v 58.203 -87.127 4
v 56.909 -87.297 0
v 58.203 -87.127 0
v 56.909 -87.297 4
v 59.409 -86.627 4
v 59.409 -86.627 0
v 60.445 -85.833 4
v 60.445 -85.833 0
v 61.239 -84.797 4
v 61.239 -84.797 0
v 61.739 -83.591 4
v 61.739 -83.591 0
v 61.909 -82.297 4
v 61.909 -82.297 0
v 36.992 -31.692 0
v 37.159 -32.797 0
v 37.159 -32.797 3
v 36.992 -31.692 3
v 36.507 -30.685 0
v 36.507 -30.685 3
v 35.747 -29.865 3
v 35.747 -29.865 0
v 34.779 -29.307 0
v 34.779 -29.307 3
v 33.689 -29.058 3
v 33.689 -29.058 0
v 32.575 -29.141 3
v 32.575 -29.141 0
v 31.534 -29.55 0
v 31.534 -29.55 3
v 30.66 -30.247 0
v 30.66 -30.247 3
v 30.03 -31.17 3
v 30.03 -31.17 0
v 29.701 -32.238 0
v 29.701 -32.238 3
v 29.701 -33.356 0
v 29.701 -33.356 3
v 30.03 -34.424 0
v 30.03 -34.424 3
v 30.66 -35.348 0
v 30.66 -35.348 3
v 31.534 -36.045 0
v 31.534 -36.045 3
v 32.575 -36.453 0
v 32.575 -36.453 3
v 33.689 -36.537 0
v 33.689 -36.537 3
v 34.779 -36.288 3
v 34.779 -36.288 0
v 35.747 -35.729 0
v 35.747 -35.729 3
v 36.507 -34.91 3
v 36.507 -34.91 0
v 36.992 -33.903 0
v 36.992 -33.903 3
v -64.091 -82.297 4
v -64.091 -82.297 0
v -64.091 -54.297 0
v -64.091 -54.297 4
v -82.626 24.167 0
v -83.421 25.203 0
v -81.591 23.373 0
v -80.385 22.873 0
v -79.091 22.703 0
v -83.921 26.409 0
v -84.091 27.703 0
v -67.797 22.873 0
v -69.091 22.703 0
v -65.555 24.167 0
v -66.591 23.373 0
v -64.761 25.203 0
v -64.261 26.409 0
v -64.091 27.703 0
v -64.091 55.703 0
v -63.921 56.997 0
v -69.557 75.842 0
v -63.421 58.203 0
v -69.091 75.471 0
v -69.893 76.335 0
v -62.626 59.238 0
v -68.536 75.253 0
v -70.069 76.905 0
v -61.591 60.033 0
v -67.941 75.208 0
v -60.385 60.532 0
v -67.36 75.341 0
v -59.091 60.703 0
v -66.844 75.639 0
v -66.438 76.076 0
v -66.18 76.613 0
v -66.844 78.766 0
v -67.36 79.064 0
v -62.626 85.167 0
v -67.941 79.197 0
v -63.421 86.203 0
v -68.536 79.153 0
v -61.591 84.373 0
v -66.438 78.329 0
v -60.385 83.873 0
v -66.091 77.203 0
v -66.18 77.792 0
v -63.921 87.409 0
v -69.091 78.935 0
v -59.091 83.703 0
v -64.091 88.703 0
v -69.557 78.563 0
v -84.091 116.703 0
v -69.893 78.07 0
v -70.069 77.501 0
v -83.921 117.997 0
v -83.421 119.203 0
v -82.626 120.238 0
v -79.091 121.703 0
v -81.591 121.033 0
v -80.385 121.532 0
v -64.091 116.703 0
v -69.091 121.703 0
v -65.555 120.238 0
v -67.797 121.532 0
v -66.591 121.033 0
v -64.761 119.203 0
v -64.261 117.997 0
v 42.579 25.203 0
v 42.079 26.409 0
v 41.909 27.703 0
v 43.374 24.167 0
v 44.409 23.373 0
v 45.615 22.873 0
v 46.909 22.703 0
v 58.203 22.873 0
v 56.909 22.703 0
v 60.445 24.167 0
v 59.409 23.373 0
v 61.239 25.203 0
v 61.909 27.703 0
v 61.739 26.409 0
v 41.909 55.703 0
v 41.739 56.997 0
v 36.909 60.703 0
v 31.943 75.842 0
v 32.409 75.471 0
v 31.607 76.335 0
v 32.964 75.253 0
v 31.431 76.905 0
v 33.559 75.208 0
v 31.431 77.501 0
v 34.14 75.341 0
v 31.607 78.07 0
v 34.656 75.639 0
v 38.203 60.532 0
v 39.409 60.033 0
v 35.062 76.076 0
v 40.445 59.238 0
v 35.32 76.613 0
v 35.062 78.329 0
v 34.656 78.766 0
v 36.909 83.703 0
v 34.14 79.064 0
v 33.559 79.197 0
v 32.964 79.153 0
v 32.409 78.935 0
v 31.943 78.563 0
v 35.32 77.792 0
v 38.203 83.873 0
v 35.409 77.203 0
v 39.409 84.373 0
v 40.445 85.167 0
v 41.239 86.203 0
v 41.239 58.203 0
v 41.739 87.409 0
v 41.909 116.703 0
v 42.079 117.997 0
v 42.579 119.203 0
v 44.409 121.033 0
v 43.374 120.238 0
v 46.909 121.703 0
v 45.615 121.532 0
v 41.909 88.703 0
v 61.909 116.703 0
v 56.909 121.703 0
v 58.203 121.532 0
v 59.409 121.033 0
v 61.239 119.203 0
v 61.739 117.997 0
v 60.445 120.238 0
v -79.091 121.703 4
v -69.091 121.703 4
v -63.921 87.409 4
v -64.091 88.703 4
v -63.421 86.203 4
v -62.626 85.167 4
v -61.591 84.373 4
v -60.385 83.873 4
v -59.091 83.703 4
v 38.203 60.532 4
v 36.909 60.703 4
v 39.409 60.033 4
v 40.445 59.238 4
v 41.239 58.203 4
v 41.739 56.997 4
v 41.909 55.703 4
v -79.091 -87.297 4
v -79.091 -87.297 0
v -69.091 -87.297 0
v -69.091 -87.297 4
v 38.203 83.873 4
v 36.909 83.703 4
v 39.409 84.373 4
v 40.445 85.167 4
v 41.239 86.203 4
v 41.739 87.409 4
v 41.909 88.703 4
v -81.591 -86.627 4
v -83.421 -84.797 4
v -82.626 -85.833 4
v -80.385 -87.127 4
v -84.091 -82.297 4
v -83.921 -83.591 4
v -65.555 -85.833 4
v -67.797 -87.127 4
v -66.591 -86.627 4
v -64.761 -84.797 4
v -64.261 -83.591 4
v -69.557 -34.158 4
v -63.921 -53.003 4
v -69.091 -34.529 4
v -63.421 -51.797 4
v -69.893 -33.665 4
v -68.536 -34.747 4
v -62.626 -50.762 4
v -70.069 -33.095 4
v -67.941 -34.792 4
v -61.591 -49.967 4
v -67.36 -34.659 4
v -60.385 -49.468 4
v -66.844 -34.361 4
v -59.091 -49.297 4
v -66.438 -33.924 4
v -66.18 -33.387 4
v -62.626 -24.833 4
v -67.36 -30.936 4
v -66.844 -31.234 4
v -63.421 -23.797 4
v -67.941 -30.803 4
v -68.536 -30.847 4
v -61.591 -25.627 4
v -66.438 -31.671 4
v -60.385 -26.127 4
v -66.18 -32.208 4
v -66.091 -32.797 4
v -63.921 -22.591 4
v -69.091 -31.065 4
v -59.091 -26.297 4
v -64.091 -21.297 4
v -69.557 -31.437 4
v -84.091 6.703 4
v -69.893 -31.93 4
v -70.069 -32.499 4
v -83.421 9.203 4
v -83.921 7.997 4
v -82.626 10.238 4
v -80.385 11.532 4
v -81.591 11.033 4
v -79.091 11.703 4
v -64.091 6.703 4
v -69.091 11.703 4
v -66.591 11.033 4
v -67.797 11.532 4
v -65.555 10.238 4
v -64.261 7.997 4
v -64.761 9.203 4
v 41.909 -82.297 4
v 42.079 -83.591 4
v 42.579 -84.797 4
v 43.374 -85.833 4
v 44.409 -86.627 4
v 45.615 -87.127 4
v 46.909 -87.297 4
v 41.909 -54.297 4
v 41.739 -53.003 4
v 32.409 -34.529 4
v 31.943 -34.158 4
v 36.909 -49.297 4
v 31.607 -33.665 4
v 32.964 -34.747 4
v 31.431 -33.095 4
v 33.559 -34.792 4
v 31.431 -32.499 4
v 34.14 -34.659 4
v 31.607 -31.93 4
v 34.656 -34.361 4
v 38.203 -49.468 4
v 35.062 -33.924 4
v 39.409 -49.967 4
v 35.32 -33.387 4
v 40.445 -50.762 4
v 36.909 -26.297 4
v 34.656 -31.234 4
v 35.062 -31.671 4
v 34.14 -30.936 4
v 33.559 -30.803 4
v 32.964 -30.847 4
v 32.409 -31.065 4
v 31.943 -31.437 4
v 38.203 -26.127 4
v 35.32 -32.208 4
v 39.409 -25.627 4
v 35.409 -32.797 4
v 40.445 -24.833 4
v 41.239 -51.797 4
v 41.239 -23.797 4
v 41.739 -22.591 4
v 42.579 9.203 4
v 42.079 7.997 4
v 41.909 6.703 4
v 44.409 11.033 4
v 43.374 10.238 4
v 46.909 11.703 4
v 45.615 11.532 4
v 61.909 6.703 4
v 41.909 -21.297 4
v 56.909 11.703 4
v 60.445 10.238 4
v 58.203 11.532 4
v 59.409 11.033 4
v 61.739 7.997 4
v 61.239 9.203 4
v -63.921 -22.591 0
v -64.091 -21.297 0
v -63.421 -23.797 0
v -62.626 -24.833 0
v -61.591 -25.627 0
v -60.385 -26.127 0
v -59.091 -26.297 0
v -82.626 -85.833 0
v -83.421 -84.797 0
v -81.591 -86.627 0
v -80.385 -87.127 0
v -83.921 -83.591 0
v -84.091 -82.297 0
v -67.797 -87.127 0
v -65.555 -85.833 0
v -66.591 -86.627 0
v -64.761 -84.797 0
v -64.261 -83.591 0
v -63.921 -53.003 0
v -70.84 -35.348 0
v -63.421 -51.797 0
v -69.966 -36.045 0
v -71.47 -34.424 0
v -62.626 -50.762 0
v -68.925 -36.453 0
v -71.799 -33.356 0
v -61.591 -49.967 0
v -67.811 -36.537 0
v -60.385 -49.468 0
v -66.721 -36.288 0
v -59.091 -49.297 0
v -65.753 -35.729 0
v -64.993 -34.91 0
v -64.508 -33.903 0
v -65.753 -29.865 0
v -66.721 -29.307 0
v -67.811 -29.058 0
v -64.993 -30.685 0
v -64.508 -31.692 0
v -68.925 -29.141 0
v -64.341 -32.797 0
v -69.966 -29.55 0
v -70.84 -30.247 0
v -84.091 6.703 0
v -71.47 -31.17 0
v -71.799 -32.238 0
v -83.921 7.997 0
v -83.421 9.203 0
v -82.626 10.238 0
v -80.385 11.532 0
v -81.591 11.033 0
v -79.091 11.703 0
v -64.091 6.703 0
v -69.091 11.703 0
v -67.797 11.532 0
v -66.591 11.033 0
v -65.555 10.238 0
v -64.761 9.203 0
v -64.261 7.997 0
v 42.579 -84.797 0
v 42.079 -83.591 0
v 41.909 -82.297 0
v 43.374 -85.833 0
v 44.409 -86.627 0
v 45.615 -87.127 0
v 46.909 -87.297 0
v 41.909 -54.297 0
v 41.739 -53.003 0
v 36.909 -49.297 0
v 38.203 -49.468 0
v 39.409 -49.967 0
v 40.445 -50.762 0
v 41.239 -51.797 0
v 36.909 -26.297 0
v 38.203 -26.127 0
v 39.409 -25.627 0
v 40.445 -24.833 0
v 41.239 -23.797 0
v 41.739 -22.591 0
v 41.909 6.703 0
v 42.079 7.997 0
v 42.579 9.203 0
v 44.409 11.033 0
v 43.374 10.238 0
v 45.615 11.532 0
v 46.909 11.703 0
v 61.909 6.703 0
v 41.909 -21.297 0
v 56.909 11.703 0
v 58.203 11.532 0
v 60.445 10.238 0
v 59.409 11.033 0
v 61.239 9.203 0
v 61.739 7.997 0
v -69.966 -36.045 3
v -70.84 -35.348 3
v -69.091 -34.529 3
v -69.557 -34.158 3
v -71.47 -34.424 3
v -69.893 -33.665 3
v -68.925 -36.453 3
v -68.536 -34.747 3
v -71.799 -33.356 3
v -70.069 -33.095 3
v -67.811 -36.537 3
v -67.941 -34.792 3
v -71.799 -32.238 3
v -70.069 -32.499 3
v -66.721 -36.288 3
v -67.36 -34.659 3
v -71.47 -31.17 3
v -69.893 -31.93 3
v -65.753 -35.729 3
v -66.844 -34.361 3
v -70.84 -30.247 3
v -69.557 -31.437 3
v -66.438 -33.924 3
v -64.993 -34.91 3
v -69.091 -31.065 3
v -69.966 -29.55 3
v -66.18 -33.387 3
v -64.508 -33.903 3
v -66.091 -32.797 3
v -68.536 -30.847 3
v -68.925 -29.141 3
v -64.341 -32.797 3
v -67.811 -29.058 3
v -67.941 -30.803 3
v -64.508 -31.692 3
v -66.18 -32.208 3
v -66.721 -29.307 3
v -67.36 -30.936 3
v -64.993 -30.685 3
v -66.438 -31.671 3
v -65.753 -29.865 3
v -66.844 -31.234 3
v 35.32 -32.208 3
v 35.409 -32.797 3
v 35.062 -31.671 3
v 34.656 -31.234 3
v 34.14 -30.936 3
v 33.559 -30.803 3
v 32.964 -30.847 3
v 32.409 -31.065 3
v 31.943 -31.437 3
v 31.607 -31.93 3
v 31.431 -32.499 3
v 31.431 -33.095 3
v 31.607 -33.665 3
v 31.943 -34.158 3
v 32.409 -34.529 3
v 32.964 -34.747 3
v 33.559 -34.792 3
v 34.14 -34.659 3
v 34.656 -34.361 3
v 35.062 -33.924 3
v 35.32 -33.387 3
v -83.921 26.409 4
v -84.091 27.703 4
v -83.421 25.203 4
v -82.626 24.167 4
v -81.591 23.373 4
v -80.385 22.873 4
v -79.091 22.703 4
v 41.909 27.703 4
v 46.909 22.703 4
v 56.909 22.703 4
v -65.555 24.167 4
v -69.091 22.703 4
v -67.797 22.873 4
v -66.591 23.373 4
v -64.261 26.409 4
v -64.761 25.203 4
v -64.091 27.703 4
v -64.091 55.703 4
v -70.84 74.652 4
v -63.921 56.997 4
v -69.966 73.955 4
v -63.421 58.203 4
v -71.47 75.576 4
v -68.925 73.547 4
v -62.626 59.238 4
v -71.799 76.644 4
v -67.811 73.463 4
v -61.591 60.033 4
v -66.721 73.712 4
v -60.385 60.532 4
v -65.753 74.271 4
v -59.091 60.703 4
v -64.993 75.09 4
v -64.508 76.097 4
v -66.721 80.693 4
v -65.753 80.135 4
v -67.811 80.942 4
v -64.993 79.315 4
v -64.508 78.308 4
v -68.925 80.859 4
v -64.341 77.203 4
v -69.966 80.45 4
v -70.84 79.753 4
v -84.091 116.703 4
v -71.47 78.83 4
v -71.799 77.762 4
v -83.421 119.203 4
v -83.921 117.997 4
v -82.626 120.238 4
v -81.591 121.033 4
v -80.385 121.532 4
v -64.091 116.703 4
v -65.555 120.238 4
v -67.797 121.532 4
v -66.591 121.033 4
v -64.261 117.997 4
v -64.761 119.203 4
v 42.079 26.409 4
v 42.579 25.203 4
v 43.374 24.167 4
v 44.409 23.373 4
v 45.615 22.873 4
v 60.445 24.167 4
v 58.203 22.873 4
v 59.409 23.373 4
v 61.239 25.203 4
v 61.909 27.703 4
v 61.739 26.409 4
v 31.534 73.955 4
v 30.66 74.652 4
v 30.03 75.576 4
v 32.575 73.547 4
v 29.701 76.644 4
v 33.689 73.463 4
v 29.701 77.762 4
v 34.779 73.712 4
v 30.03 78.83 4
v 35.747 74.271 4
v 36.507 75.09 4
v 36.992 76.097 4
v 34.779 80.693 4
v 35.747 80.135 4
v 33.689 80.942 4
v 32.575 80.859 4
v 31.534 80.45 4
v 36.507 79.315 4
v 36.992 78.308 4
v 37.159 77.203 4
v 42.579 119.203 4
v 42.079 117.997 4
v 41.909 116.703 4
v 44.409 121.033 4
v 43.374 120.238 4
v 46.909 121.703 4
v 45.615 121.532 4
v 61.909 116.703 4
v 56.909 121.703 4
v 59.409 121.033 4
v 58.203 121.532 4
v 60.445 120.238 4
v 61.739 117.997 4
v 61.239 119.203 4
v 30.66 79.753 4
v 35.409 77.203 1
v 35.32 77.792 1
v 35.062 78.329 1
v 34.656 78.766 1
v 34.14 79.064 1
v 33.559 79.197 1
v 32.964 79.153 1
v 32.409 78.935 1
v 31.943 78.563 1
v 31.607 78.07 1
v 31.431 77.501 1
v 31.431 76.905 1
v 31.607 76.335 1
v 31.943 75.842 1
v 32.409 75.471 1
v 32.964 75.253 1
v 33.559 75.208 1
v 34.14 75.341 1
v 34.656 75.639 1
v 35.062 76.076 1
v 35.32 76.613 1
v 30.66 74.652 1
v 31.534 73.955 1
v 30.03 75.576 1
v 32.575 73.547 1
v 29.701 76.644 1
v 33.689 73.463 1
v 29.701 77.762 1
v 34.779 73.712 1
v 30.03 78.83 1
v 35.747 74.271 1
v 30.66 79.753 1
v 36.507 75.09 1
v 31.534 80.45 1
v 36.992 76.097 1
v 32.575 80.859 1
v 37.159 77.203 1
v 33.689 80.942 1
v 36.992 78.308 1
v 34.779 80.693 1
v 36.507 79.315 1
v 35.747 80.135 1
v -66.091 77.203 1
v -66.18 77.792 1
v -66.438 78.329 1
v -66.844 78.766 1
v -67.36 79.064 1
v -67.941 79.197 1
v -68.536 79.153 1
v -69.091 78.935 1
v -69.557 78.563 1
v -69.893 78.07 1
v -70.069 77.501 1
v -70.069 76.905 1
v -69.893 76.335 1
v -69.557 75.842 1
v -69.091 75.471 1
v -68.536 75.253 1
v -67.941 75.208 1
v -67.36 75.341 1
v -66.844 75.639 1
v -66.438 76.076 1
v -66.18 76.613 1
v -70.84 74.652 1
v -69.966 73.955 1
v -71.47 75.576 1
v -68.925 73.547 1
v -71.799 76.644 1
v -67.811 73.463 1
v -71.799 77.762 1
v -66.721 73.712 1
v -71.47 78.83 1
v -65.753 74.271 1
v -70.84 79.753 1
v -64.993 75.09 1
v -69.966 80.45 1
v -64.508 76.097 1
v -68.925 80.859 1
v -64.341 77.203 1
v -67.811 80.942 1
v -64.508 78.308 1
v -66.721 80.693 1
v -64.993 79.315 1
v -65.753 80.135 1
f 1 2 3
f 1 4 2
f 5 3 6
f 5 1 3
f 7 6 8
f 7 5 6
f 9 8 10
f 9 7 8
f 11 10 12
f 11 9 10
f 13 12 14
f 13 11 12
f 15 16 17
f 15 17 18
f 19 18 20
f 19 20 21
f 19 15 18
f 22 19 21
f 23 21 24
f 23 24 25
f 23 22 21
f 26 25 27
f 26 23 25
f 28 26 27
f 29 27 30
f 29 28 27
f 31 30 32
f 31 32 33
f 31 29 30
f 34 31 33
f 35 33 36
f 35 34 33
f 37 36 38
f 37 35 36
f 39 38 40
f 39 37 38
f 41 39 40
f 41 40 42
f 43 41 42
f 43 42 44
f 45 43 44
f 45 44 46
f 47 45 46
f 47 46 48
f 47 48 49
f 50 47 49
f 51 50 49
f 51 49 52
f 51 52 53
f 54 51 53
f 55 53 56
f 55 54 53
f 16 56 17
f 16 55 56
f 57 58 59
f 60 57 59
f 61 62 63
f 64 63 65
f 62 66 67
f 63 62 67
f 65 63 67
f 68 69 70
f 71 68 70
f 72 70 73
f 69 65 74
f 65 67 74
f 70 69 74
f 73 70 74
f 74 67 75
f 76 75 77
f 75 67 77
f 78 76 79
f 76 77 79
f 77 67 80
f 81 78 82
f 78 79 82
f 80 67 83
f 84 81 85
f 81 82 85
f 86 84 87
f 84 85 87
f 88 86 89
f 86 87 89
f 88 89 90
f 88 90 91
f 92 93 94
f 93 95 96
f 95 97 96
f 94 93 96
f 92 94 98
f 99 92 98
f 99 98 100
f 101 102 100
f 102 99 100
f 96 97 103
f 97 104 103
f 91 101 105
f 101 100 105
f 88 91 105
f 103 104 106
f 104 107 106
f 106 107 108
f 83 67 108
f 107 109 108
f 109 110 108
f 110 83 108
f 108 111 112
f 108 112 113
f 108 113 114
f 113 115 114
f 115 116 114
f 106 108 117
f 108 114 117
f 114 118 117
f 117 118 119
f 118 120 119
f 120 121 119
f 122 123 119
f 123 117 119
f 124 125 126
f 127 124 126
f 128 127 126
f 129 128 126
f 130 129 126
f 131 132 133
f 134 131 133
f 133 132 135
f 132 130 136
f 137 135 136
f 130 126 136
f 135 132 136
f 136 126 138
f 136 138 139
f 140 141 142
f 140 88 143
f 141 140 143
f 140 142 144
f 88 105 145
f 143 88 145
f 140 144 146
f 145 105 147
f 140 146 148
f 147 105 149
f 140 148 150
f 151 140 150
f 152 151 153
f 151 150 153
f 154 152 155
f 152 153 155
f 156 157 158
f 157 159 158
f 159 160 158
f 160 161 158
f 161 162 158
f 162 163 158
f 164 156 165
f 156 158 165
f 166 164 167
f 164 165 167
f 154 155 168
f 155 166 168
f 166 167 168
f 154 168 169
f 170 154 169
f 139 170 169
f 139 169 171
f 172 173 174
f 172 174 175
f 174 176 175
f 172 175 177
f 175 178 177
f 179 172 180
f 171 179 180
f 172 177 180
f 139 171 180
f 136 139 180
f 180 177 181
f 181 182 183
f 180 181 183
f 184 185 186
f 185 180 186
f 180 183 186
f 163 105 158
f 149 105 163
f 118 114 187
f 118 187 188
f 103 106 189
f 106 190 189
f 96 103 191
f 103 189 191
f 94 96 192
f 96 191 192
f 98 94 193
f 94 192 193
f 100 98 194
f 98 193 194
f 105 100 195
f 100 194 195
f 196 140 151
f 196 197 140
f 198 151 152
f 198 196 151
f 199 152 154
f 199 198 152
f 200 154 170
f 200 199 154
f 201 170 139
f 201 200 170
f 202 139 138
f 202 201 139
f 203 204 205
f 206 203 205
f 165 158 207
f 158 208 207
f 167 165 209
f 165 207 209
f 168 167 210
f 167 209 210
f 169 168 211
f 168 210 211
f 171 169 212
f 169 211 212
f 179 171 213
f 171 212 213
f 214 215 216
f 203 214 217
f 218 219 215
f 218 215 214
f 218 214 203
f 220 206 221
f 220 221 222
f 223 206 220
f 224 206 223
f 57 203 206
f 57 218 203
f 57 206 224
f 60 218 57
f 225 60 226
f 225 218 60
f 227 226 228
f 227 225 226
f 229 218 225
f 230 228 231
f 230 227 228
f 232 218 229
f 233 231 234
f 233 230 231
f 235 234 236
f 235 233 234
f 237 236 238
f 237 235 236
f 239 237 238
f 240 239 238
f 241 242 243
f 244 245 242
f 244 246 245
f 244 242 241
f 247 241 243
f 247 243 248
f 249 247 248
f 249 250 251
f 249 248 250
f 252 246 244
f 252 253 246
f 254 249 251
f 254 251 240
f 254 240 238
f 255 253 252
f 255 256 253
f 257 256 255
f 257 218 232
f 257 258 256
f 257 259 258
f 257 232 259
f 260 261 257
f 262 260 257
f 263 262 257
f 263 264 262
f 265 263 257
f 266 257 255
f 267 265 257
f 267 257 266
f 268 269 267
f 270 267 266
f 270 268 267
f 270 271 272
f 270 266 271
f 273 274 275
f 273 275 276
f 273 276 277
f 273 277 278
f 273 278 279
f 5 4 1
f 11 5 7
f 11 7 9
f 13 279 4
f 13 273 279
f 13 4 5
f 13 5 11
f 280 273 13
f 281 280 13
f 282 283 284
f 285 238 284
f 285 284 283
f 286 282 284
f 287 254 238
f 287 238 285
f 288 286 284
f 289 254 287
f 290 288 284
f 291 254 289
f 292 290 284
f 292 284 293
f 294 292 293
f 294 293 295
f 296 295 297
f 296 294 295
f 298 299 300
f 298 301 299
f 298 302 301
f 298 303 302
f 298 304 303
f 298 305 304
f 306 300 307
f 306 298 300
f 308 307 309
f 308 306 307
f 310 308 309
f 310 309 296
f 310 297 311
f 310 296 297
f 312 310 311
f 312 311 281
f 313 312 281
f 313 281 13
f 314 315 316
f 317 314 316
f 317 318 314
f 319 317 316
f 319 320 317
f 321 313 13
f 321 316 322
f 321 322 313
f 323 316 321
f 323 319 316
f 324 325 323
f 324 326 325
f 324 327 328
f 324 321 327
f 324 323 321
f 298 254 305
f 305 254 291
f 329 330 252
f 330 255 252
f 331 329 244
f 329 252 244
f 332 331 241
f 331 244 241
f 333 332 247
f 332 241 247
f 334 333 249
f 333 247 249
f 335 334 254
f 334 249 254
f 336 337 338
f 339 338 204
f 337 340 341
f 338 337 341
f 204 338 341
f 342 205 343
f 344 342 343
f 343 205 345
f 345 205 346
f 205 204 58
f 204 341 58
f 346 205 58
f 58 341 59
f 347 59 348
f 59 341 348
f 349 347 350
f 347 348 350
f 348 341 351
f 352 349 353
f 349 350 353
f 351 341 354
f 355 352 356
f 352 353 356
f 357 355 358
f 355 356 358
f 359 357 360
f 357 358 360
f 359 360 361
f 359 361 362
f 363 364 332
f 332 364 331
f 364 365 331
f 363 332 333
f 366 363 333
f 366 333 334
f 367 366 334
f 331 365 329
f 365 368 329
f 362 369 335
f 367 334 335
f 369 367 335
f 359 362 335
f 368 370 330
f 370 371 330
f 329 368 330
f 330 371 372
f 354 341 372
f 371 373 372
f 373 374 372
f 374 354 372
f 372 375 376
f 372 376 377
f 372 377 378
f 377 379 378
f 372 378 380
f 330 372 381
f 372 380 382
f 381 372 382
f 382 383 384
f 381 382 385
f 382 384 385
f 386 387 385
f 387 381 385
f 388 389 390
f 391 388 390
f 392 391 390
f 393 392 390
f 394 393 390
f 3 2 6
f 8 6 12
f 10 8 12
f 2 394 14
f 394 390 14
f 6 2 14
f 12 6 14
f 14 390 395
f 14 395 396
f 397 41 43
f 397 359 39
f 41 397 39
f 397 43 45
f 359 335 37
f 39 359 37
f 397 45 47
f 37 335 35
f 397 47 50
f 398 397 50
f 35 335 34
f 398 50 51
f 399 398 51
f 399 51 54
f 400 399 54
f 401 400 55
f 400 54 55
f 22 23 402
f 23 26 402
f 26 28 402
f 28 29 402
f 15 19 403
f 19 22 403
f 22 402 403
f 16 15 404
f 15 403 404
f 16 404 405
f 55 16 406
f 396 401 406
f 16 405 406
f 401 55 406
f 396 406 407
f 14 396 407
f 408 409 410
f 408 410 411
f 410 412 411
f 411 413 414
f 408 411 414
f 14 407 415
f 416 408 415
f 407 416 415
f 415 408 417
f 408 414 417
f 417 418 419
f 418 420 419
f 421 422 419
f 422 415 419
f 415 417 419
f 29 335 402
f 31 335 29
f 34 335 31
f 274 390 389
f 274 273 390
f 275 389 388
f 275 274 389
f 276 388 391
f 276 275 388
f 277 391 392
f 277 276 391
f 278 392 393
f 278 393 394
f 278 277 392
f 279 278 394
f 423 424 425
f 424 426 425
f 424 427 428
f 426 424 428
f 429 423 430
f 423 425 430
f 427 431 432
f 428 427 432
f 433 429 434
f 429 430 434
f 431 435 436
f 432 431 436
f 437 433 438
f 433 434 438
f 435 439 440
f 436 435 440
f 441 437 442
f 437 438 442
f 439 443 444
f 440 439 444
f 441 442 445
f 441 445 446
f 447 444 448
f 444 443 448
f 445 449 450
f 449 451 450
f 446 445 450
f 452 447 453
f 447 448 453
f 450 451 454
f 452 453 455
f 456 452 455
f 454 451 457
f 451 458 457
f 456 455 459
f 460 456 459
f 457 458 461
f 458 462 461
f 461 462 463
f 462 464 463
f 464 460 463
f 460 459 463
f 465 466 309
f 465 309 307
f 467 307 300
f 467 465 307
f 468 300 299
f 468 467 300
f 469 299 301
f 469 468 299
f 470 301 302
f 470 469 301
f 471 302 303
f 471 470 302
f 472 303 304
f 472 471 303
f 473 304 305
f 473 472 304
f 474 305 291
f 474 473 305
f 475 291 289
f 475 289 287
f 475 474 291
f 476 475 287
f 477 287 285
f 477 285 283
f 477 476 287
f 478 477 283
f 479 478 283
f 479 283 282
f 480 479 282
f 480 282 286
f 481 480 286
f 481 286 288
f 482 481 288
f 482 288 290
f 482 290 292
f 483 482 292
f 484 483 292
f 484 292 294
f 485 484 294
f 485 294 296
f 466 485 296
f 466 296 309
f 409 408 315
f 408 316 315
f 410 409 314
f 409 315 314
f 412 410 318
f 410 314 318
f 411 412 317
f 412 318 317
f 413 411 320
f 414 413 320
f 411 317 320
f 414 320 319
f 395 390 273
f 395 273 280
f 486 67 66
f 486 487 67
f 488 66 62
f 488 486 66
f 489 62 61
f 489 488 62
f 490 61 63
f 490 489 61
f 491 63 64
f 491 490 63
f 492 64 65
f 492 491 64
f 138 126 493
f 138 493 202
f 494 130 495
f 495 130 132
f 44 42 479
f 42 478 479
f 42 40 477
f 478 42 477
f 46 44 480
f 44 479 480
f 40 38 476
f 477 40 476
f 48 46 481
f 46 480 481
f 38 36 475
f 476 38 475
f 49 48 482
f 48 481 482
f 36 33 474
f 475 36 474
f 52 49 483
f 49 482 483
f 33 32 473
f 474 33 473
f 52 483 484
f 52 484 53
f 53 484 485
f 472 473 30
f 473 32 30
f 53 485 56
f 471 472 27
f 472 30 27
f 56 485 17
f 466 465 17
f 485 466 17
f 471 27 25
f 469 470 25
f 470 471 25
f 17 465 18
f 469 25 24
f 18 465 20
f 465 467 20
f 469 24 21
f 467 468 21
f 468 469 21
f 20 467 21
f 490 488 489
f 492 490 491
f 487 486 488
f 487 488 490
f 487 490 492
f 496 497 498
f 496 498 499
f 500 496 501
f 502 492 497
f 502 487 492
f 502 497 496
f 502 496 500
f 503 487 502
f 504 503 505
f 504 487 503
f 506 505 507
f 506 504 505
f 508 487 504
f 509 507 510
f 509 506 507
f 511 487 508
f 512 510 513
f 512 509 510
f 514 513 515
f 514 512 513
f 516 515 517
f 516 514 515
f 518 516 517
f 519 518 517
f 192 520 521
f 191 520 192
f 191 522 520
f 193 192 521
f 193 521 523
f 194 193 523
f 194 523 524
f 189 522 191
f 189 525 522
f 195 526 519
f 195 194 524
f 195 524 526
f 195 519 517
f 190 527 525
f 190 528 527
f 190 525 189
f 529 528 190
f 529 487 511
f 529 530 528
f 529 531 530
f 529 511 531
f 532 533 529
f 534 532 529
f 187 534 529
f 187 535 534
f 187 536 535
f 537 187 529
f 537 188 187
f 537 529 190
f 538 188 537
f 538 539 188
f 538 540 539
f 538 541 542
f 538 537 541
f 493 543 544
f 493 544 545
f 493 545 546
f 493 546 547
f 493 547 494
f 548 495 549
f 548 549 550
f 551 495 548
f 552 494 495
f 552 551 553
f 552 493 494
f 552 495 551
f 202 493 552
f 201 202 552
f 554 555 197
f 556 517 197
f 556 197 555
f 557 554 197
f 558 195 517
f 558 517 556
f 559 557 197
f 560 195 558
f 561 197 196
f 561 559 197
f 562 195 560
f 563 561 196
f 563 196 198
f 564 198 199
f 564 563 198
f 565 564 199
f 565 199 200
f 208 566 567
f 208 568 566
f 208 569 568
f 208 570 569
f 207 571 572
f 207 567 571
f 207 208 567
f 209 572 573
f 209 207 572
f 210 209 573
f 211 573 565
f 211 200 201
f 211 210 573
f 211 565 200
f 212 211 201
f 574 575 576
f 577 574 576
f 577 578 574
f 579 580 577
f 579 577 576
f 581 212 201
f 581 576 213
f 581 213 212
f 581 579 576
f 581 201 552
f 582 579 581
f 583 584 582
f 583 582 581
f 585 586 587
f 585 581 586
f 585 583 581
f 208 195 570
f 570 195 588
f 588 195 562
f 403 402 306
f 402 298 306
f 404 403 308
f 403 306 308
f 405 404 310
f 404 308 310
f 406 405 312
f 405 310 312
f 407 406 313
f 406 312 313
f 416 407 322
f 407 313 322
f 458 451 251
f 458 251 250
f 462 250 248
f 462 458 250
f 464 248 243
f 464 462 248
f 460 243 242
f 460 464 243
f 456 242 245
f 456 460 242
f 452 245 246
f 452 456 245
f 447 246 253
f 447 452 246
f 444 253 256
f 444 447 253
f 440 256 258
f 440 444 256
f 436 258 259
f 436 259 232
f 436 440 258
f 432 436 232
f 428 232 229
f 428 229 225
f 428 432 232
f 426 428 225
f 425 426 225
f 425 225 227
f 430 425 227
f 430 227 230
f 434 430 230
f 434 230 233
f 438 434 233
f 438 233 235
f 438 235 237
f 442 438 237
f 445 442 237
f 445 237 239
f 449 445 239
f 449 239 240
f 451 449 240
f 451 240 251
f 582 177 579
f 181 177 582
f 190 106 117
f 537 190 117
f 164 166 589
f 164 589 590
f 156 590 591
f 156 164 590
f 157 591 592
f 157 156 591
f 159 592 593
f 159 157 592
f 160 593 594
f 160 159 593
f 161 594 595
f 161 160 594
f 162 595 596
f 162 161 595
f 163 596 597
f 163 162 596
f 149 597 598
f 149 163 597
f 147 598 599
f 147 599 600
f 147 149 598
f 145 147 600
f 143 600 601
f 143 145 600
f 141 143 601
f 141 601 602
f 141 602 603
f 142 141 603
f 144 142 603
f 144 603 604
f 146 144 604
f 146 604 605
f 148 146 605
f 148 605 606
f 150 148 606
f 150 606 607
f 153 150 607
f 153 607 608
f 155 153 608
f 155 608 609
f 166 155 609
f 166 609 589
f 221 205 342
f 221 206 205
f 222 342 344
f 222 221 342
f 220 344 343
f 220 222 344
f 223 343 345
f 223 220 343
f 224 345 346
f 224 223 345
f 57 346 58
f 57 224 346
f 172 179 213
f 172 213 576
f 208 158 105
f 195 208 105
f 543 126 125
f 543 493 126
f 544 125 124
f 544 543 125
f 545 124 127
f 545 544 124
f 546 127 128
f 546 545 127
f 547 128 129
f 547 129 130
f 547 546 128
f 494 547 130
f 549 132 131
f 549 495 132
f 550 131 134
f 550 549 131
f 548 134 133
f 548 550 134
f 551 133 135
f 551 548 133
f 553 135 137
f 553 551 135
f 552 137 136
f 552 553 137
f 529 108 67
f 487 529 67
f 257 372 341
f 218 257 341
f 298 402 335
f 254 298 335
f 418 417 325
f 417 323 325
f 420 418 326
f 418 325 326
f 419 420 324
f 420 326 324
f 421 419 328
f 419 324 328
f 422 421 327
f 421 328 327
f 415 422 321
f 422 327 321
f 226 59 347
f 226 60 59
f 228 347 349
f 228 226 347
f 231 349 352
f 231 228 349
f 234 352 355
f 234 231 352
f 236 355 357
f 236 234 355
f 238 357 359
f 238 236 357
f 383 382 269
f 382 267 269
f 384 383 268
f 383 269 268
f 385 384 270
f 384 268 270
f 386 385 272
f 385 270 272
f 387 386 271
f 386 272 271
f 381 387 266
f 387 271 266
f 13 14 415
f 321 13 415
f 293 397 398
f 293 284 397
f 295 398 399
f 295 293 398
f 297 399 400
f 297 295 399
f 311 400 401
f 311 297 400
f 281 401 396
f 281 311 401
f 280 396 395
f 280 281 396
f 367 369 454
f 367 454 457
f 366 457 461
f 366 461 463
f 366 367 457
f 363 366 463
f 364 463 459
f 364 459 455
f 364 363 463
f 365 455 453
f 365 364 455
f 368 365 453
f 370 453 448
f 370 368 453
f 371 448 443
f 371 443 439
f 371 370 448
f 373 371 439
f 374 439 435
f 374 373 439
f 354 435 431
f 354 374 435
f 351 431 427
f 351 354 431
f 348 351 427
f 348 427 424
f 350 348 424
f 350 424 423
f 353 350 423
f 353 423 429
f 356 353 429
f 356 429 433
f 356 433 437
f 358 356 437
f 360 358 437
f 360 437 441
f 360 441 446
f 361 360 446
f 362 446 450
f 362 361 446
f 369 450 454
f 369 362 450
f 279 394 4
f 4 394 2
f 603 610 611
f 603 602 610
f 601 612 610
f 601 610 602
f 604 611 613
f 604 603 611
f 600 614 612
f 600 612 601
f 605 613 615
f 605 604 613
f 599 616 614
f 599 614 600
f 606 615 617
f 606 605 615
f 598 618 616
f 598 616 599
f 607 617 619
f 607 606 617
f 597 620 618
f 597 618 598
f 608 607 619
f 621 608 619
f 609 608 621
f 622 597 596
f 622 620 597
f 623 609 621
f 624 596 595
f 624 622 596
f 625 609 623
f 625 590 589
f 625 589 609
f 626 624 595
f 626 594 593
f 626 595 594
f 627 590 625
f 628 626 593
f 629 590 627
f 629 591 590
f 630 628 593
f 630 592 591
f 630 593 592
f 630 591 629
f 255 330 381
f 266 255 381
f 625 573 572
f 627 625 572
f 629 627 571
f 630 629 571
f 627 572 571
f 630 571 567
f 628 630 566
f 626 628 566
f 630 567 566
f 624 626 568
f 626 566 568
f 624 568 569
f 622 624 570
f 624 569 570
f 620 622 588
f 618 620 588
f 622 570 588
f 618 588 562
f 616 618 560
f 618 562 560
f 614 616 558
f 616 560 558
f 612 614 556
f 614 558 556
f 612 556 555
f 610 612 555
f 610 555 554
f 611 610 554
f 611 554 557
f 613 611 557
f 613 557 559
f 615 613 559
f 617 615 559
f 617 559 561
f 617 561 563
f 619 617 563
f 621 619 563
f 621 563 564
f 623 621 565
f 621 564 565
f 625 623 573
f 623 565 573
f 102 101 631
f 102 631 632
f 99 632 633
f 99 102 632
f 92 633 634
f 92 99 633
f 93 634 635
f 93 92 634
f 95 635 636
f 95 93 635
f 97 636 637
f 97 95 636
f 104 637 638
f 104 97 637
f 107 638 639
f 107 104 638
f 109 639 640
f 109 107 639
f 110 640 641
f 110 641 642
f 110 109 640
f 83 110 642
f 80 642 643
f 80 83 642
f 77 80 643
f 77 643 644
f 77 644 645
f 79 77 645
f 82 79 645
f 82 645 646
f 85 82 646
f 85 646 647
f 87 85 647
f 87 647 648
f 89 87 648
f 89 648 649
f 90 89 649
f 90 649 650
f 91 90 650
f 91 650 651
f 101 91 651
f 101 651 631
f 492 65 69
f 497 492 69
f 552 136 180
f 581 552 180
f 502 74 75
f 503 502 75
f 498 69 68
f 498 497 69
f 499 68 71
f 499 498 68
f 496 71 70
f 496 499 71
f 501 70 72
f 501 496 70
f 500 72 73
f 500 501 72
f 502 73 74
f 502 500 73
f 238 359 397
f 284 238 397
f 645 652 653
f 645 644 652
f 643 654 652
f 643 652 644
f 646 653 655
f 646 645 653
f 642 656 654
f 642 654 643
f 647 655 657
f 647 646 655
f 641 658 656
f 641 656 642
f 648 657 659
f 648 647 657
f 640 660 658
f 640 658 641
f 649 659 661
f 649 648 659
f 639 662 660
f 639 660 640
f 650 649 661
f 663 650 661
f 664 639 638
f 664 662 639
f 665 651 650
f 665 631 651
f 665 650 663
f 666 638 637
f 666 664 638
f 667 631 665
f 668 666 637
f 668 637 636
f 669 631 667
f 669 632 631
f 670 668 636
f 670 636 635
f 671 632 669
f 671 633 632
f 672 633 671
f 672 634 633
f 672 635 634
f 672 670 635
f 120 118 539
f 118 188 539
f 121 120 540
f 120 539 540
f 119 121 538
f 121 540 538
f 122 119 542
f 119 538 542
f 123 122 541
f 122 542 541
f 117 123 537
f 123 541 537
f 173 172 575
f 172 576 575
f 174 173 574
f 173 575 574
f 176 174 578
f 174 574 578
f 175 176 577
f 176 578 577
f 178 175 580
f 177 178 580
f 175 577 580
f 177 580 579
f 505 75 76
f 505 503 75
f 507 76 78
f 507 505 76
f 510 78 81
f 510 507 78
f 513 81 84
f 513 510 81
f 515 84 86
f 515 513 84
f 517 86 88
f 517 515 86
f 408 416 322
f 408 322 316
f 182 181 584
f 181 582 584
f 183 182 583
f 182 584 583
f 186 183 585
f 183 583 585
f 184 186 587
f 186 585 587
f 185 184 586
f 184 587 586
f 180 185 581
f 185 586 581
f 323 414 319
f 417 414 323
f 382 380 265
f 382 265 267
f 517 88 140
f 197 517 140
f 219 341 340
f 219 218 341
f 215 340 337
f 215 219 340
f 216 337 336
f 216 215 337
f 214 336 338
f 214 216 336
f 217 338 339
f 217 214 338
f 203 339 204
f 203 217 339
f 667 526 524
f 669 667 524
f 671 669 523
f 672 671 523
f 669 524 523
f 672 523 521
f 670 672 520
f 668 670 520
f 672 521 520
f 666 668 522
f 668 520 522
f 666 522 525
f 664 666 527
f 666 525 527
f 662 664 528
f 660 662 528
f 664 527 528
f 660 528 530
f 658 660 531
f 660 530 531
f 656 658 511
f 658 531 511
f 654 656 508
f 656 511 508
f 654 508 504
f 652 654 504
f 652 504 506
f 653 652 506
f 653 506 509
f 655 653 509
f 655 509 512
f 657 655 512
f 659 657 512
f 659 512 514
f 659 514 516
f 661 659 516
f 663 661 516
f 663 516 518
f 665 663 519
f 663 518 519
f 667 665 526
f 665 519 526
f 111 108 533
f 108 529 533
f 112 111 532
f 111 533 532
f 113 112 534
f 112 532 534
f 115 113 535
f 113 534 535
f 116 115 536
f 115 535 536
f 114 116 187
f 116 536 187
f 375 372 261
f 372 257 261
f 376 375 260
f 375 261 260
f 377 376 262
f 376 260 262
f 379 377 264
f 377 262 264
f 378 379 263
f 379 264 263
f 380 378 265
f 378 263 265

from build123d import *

# Parameters (mm, degrees)
F0_W     = 20
F0_H     = 38
F0_R     = 3.75
F0_R_2   = 2
F1_DEPTH = 4
F2_R     = 5
F5_DEPTH = 3
F6_R     = 3.75
F6_R_2   = 2
F7_DEPTH = 3


with BuildPart() as f1:
    # F0 (on Top) → F1 (new body)
    with BuildSketch(Plane.XY):
        with Locations((-74.0909231007, -7.2973352671)):
            Rectangle(F0_W, F0_H)
        with Locations((-74.0909231007, -68.2973352671)):
            Rectangle(F0_W, F0_H)
        Polygon((-64.0909231007, -26.2973352671), (-84.0909231007, -26.2973352671), (-84.0909231007, -49.2973352671), (-64.0909231007, -49.2973352671), (41.9090768993, -49.2973352671), (61.9090768993, -49.2973352671), (61.9090768993, -26.2973352671), (41.9090768993, -26.2973352671), align=None)
        with Locations((-68.0909231007, -32.7973352671)):
            Circle(F0_R, mode=Mode.SUBTRACT)
        with Locations((33.4090768993, -32.7973352671)):
            Circle(F0_R, mode=Mode.SUBTRACT)
        with Locations((51.9090768993, -7.2973352671)):
            Rectangle(F0_W, F0_H)
        with Locations((51.9090768993, -68.2973352671)):
            Rectangle(F0_W, F0_H)
        with Locations((-68.0909231007, -32.7973352671)):
            Circle(F0_R)
        with Locations((-68.0909231007, -32.7973352671)):
            Circle(F0_R_2, mode=Mode.SUBTRACT)
        with Locations((33.4090768993, -32.7973352671)):
            Circle(F0_R)
        with Locations((33.4090768993, -32.7973352671)):
            Circle(F0_R_2, mode=Mode.SUBTRACT)
    extrude(amount=F1_DEPTH)

    # F2
    f2_edges = [f1.edges().sort_by_distance(p)[0] for p in [
        (-64.090923, -49.297335, 2),
        (-64.090923, -87.297335, 2),
        (41.909077, -87.297335, 2),
        (61.909077, -87.297335, 2),
        (-84.090923, -87.297335, 2),
        (-64.090923, -26.297335, 2),
        (-84.090923, 11.702665, 2),
        (-64.090923, 11.702665, 2),
        (41.909077, -26.297335, 2),
        (41.909077, 11.702665, 2),
        (61.909077, 11.702665, 2),
        (41.909077, -49.297335, 2),
    ]]
    fillet(f2_edges, radius=F2_R)


with BuildPart() as f3_1:
    # F3: copy of F1
    add(f1.part)


with BuildPart() as f3_1_1:
    # F4: moved
    add(f3_1.part.moved(Location((0, 110, 0))))

    # F6 (on face) → F7 (cut)
    with BuildSketch(Plane.XY.offset(4)):
        with Locations((-68.0909231007, 77.2026647329)):
            Circle(F6_R)
        with Locations((-68.0909231007, 77.2026647329)):
            Circle(F6_R_2, mode=Mode.SUBTRACT)
        with Locations((33.4090768993, 77.2026647329)):
            Circle(F6_R)
        with Locations((33.4090768993, 77.2026647329)):
            Circle(F6_R_2, mode=Mode.SUBTRACT)
    extrude(amount=-F7_DEPTH, mode=Mode.SUBTRACT)


with BuildPart() as f1_1:
    add(f1.part)

    # F0 (on Top) → F5 (cut)
    with BuildSketch(Plane.XY):
        with Locations((-68.0909231007, -32.7973352671)):
            Circle(F0_R)
        with Locations((-68.0909231007, -32.7973352671)):
            Circle(F0_R_2, mode=Mode.SUBTRACT)
        with Locations((33.4090768993, -32.7973352671)):
            Circle(F0_R)
        with Locations((33.4090768993, -32.7973352671)):
            Circle(F0_R_2, mode=Mode.SUBTRACT)
    extrude(amount=F5_DEPTH, mode=Mode.SUBTRACT)


solid = Compound([f3_1_1.part, f1_1.part])
